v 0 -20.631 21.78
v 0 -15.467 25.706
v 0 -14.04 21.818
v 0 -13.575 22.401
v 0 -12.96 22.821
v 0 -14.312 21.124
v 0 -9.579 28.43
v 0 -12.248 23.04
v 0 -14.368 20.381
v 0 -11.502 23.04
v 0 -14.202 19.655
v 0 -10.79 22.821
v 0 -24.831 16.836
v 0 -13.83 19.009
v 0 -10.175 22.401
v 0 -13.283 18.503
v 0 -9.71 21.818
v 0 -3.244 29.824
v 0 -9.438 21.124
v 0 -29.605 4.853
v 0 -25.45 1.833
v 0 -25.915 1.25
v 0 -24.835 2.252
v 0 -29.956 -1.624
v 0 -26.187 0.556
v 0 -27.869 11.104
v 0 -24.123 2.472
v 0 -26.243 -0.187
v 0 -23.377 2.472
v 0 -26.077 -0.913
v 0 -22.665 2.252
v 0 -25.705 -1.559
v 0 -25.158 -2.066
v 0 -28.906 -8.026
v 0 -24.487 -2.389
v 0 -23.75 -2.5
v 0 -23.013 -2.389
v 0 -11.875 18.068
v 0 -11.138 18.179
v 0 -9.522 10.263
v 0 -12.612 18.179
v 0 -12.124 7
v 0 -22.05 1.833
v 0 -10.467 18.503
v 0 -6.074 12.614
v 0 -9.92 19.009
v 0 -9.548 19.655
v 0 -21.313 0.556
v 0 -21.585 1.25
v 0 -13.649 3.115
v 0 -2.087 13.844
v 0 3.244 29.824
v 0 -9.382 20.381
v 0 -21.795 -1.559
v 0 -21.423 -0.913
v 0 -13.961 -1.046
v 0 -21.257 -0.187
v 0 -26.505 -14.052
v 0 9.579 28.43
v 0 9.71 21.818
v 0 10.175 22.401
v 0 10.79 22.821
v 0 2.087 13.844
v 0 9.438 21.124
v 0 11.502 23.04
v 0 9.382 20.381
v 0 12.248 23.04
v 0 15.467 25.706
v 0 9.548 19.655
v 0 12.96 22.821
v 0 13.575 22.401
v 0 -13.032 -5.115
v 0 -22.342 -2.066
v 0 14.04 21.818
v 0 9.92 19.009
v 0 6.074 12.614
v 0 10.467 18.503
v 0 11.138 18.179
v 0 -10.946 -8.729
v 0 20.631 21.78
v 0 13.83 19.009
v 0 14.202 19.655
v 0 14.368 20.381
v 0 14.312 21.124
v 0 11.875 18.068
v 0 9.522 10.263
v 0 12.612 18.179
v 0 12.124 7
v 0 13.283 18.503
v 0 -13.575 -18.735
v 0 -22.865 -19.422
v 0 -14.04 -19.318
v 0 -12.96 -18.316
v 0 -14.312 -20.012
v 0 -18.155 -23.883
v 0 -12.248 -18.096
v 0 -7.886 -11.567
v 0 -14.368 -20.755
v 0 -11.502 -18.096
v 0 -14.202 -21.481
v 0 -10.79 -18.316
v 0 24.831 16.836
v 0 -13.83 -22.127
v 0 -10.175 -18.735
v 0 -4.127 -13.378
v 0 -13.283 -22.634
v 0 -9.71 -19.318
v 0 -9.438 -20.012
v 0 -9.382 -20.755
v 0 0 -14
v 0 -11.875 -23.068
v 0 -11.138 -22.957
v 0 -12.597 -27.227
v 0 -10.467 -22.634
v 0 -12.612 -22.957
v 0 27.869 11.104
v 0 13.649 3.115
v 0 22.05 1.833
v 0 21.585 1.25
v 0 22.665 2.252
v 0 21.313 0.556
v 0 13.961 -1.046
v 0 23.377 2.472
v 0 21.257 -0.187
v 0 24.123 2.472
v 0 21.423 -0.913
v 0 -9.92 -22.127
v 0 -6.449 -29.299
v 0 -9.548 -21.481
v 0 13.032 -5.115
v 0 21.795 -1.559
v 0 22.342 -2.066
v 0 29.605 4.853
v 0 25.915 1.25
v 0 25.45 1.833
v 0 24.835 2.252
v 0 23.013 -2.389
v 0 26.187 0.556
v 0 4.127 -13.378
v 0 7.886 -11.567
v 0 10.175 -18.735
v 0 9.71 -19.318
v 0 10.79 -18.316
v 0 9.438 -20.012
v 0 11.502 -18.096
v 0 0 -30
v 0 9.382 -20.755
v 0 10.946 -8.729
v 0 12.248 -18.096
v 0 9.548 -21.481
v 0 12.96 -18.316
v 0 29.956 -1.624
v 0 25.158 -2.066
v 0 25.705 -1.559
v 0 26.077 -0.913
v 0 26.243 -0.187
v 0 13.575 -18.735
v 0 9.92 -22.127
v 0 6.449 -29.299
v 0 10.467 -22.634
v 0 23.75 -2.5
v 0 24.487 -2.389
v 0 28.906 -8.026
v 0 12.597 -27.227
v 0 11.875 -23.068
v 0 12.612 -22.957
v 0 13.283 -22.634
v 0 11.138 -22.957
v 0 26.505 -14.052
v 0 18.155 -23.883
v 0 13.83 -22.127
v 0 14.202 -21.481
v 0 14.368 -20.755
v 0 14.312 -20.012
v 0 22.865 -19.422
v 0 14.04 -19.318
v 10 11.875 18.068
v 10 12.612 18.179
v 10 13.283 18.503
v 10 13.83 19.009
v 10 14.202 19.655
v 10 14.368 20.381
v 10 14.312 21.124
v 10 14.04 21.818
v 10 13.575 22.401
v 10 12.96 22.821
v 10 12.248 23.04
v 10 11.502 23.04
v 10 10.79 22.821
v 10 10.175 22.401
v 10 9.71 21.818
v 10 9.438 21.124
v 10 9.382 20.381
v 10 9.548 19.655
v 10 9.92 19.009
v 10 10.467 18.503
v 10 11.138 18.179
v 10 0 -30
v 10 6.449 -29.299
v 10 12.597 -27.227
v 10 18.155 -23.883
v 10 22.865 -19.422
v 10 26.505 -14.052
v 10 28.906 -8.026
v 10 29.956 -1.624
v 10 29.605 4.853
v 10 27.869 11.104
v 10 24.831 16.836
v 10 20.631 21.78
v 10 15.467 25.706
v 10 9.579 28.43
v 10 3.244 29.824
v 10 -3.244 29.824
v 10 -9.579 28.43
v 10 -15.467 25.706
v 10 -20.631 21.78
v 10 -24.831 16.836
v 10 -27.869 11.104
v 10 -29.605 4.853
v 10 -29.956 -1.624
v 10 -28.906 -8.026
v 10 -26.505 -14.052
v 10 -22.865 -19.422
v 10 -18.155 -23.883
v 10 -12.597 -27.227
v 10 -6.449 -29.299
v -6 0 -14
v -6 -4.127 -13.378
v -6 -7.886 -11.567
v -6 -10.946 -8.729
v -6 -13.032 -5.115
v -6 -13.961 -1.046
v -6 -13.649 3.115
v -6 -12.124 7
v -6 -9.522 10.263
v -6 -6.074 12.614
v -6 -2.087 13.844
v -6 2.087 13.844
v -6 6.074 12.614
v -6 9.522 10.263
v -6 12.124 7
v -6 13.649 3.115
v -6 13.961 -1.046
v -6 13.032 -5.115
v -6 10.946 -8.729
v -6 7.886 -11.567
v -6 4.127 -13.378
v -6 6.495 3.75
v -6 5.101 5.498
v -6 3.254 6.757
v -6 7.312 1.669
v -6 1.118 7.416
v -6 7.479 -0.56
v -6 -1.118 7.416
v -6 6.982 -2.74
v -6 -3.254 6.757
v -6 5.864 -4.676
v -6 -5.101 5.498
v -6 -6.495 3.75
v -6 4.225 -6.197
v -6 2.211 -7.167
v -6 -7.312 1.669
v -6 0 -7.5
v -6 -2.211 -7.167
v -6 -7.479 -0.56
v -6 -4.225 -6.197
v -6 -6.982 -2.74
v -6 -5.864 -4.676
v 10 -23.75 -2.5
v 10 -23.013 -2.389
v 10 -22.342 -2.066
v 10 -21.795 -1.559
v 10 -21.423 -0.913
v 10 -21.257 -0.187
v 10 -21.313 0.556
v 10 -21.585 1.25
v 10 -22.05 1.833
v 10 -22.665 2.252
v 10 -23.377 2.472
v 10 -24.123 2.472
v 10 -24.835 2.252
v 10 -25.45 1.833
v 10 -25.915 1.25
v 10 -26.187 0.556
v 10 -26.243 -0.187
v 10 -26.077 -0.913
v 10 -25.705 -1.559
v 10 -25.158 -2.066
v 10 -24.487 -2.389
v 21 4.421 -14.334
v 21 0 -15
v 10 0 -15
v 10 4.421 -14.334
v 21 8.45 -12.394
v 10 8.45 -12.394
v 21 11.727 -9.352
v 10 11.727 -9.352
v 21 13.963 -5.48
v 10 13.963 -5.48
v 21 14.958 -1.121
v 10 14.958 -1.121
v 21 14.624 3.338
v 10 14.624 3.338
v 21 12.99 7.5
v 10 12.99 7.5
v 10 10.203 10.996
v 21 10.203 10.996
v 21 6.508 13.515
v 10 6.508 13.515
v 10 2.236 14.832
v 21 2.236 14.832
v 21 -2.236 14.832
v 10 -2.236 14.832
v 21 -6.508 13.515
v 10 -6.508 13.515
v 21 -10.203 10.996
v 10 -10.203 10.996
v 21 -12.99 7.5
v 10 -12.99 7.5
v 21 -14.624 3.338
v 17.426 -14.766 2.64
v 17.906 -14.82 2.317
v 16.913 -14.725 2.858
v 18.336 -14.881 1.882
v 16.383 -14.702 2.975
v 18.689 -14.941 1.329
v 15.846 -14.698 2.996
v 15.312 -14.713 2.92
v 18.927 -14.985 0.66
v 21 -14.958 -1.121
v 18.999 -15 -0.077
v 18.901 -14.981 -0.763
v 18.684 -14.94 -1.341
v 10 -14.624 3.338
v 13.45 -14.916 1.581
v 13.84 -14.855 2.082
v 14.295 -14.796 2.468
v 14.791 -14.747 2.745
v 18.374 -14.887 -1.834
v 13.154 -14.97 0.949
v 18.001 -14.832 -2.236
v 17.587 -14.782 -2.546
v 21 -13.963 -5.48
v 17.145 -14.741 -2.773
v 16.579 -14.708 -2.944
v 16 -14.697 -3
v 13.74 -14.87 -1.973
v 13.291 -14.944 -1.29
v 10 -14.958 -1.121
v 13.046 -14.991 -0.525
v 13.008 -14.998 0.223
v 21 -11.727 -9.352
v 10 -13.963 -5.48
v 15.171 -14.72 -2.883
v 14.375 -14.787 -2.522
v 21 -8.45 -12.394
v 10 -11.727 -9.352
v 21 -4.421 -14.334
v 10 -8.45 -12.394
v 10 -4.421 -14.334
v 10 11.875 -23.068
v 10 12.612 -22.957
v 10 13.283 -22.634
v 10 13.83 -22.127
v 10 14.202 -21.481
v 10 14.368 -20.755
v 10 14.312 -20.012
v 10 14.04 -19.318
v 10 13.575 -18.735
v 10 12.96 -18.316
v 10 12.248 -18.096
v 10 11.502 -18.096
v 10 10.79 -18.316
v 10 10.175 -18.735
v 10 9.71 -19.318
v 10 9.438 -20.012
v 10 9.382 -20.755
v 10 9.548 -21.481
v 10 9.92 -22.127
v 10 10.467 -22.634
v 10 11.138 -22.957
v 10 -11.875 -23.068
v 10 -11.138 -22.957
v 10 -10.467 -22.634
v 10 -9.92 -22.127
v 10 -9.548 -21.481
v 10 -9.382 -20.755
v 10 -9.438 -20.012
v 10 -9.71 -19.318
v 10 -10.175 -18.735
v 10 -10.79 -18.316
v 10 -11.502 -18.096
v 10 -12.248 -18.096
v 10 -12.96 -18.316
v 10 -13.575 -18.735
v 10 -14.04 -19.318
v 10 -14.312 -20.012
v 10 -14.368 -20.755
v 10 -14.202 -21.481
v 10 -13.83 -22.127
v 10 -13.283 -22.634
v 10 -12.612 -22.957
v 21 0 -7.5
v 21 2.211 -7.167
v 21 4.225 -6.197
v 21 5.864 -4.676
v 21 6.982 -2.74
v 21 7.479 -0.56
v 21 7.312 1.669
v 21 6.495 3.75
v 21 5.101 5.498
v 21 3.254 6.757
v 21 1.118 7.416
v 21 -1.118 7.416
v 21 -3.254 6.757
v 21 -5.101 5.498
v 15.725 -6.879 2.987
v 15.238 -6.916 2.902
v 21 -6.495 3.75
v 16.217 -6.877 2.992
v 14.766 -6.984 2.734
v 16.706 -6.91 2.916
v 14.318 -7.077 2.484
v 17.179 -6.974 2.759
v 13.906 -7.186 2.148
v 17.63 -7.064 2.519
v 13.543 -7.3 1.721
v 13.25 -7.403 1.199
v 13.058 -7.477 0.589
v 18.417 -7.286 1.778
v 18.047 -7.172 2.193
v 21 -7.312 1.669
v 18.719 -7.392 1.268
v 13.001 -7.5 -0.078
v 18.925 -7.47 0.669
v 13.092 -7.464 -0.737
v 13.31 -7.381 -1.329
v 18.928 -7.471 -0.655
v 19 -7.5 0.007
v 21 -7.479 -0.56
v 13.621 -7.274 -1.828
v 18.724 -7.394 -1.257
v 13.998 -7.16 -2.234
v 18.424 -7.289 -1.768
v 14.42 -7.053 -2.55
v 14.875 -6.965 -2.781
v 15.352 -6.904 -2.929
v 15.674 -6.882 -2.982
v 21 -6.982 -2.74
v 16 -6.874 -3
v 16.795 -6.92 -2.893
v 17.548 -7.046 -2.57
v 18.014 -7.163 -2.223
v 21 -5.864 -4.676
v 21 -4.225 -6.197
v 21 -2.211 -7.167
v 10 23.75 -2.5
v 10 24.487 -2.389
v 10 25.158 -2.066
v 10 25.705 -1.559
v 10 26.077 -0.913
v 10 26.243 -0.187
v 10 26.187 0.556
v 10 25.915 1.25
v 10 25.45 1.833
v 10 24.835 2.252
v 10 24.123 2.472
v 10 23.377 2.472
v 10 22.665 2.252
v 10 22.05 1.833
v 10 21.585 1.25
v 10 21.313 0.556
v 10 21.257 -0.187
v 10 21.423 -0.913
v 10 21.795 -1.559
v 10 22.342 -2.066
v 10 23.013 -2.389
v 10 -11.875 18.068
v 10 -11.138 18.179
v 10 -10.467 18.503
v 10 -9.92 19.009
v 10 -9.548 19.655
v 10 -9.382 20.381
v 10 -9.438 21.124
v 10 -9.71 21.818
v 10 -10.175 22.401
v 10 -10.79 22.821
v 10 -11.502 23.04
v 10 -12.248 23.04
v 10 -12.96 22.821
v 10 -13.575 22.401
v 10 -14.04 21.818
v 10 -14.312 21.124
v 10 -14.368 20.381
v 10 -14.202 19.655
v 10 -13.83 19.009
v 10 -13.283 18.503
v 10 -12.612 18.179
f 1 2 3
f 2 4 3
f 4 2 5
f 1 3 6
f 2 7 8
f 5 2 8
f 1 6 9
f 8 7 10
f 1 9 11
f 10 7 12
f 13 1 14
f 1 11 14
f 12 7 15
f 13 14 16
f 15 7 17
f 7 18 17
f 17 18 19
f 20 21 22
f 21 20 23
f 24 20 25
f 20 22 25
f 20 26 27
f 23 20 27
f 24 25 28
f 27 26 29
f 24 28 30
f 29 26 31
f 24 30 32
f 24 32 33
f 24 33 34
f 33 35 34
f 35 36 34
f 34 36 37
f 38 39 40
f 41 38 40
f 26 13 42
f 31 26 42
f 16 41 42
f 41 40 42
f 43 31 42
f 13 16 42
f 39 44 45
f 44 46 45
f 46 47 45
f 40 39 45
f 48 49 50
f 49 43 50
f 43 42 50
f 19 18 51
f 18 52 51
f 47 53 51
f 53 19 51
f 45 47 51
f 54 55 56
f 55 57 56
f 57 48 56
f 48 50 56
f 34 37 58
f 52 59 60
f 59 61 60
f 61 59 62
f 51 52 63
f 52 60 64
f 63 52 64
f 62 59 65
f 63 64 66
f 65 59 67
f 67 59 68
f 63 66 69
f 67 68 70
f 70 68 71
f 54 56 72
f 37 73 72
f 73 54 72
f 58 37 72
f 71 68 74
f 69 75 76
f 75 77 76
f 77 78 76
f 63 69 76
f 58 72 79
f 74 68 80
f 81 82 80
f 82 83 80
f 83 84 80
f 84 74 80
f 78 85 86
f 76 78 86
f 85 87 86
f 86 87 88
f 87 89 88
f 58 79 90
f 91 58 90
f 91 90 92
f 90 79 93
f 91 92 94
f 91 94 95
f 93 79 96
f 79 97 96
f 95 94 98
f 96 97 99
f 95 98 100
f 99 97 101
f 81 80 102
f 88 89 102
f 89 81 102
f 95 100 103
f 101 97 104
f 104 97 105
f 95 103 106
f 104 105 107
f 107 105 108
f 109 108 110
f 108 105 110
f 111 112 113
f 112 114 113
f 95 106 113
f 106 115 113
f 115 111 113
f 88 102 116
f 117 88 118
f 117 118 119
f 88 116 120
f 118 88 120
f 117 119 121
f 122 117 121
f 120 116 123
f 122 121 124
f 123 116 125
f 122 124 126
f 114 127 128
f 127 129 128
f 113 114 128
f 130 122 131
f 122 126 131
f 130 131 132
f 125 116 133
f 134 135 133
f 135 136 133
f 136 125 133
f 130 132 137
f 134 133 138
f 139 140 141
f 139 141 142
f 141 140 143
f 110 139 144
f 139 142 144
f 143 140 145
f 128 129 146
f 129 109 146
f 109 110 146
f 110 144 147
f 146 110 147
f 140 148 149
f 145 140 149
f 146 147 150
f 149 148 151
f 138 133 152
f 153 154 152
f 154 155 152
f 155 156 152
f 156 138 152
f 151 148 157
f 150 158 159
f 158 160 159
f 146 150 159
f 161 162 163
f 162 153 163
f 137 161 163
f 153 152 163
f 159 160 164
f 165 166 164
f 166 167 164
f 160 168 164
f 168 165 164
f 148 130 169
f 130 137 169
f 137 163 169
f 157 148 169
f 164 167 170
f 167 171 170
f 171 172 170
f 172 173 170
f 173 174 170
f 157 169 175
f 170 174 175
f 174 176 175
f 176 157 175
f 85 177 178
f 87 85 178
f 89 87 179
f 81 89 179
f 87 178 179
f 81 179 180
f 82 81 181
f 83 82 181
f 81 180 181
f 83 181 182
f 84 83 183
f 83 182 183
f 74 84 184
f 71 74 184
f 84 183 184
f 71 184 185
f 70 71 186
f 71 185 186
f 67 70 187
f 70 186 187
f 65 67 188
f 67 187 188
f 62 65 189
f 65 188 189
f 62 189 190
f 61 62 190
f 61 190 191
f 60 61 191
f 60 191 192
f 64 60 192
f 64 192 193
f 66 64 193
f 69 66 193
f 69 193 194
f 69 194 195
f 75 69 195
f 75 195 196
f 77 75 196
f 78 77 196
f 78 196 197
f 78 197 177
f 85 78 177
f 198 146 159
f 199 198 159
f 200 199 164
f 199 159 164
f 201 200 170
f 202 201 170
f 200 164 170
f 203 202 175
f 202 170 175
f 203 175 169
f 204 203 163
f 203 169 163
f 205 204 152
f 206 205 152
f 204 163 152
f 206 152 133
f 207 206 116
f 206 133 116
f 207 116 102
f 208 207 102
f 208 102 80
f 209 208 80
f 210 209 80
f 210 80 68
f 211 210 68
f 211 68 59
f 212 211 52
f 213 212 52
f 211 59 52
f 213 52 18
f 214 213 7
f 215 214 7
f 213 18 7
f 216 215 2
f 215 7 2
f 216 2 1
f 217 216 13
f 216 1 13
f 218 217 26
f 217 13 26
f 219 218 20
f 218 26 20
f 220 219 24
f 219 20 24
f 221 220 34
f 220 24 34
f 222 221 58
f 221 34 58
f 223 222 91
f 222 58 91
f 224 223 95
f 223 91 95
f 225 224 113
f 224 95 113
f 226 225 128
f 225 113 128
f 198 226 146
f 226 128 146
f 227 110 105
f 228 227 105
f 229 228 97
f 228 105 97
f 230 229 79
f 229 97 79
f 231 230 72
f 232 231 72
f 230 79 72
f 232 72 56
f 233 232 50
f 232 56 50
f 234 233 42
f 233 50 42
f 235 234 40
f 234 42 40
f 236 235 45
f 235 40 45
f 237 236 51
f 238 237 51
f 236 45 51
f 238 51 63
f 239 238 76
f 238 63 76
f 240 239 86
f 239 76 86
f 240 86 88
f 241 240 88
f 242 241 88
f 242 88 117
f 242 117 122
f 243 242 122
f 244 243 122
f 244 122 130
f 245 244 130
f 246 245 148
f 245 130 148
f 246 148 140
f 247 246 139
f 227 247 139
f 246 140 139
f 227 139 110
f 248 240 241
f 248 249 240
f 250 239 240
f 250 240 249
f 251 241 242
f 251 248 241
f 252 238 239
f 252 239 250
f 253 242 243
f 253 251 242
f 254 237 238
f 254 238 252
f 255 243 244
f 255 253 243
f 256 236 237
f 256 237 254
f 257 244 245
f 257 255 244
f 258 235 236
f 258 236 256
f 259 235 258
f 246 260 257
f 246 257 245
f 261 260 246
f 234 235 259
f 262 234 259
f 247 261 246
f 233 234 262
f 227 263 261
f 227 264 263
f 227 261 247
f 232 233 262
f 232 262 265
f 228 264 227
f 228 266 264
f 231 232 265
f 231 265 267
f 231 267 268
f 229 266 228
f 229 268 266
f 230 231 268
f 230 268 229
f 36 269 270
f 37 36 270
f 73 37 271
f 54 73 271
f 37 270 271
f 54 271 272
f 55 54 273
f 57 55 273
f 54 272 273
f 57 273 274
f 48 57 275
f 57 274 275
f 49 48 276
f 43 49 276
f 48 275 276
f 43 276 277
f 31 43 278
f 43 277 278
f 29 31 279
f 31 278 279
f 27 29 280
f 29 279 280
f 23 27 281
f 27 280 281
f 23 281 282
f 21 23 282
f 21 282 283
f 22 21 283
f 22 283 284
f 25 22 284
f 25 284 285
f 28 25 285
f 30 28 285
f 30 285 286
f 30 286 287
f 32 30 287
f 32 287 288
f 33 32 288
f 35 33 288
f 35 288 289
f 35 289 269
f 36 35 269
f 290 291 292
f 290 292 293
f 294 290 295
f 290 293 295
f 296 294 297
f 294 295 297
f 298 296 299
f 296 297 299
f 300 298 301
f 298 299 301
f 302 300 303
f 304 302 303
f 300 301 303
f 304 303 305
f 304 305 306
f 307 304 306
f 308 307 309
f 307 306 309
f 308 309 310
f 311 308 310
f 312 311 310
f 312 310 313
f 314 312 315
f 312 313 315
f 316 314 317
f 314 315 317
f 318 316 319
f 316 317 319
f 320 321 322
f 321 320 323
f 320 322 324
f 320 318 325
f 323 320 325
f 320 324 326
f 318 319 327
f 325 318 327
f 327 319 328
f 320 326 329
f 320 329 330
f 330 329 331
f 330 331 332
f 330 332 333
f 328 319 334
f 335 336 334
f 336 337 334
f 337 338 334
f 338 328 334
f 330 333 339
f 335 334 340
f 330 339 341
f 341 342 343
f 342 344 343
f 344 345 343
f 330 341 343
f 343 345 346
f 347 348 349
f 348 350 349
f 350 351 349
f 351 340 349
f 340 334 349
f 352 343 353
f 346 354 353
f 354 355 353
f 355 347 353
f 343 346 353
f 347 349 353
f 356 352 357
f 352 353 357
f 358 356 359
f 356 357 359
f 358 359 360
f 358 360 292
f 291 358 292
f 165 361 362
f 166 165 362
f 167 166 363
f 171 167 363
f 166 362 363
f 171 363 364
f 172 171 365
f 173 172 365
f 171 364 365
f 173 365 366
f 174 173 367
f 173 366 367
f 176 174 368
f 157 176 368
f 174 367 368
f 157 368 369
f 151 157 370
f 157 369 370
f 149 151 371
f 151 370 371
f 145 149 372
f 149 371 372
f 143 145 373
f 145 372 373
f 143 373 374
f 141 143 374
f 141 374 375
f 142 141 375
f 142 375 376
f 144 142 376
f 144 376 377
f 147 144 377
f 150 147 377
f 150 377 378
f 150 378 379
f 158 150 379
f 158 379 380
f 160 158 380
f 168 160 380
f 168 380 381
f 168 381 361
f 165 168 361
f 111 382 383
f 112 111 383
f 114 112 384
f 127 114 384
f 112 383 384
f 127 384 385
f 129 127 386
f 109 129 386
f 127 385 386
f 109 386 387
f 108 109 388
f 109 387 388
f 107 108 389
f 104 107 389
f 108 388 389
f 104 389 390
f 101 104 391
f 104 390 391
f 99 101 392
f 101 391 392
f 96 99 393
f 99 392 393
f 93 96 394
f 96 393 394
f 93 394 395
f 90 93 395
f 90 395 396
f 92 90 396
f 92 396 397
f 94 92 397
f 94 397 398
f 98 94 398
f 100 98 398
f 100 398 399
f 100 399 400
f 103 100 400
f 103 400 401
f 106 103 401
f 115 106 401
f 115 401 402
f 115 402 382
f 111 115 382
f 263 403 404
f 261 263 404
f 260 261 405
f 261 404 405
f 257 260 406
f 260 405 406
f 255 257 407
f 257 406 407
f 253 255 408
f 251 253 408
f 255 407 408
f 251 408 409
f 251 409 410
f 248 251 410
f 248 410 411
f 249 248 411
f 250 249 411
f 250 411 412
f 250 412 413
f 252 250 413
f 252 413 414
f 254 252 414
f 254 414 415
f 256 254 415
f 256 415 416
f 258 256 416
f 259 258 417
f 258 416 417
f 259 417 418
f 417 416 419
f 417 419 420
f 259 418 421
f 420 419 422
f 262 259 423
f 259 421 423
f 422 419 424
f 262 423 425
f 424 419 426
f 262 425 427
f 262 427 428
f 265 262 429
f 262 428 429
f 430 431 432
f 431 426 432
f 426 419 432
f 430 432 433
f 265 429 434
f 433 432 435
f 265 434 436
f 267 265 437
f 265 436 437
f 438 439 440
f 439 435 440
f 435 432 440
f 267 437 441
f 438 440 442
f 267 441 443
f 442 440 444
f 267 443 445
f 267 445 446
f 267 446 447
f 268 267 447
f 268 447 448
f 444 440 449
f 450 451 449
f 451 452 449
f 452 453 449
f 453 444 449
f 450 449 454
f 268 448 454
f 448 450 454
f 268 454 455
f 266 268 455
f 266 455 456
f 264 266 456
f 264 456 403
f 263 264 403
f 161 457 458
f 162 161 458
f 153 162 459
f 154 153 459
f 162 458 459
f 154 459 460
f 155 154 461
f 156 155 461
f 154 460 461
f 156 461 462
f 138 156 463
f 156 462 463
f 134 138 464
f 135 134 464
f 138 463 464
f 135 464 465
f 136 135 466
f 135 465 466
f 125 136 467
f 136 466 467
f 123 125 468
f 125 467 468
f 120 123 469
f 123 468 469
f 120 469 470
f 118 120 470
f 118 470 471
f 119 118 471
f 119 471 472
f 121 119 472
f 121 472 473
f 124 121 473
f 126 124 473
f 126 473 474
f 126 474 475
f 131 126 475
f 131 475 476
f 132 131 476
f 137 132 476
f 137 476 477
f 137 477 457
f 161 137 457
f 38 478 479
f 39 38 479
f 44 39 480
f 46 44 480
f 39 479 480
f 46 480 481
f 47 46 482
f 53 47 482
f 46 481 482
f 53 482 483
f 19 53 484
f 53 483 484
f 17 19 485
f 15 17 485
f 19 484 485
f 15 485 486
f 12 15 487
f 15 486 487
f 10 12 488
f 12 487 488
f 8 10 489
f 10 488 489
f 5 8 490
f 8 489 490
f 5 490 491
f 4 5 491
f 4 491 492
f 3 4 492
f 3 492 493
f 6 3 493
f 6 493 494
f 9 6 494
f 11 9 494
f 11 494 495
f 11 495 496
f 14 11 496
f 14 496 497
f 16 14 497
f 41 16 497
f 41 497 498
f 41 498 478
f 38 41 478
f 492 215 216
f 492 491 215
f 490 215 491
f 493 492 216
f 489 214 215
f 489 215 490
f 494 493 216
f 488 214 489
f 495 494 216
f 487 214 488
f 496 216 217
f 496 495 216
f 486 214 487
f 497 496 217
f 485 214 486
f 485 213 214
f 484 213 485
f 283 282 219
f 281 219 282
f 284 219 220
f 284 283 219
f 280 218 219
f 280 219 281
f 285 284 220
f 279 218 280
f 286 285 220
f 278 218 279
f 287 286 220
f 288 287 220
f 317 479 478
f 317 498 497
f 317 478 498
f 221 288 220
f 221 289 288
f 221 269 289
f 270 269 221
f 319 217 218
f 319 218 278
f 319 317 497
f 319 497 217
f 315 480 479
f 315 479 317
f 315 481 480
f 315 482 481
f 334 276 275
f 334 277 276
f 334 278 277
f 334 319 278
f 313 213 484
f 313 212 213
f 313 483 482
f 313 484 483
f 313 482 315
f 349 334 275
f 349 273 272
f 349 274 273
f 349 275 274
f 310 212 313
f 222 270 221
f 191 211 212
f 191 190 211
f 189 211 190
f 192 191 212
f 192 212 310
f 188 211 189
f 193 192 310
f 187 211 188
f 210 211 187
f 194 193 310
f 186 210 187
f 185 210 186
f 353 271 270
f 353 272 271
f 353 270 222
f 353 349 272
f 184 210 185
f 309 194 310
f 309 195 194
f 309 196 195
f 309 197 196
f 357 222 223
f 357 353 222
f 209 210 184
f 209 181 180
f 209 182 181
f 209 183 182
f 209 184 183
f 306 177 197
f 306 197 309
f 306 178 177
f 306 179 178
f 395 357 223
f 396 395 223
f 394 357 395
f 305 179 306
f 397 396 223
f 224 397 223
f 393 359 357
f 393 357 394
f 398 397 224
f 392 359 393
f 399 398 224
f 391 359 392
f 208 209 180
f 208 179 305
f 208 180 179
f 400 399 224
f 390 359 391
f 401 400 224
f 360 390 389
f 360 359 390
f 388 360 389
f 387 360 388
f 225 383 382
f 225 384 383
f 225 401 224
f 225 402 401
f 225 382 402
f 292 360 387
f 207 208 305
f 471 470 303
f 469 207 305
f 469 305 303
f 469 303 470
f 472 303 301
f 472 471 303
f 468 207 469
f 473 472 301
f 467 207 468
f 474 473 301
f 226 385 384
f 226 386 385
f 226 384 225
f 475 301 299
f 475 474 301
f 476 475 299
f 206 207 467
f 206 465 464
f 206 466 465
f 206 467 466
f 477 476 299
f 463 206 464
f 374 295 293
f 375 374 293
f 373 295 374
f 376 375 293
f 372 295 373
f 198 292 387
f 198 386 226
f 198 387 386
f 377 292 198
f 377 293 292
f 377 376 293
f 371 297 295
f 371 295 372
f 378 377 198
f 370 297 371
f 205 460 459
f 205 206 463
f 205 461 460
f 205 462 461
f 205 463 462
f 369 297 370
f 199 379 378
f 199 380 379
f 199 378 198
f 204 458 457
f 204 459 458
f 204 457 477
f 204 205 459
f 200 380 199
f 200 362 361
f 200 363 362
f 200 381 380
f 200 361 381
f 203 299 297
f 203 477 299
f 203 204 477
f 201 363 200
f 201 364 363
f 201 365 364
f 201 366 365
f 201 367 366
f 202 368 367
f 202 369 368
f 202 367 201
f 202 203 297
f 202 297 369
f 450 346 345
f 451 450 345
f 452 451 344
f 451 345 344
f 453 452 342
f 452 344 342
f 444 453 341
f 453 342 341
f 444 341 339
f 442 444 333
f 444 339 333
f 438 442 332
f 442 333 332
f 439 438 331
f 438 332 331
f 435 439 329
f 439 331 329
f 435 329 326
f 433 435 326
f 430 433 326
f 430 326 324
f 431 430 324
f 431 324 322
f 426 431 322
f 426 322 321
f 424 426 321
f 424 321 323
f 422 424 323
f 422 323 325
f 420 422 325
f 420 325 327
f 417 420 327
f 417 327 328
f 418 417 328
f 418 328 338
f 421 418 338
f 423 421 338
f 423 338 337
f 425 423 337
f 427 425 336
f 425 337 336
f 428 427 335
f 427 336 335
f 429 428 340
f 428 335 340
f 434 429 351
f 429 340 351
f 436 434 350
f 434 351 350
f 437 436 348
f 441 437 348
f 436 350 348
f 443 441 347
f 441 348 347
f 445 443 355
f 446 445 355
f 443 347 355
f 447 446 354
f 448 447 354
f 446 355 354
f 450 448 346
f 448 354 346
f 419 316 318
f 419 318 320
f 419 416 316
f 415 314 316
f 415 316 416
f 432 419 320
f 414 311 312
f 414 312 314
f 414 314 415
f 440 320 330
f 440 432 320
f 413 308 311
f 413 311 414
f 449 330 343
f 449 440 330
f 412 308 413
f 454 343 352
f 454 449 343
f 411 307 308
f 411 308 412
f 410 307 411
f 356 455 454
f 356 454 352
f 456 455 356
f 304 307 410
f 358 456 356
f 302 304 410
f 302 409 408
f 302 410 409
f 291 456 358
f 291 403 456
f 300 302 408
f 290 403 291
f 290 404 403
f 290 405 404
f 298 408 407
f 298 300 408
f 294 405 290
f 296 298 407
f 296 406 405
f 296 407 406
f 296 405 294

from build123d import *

# Parameters (mm, degrees)
SKETCH1_R               = 30
BOSS_EXTRUDE1_DEPTH     = 10
SKETCH2_R               = 2.5
CUT_EXTRUDE1_DEPTH      = 44.588989435
SKETCH5_R               = 14
BOSS_EXTRUDE4_DEPTH     = 6
SKETCH8_R               = 15
BOSS_EXTRUDE6_DEPTH     = 1
SKETCH13_R              = 15
BOSS_EXTRUDE7_DEPTH     = 10
CUT_EXTRUDE4_REACH      = 52.289
SKETCH14_R              = 7.5
CUT_EXTRUDE3_REACH      = 60.017
CUT_EXTRUDE3_END_RADIUS = 7.5
SKETCH12_R              = 3


with BuildPart() as part:
    # Sketch1 → Boss-Extrude1 (new body)
    with BuildSketch(Plane(origin=(0, 0, 0), x_dir=(0, 0, -1), z_dir=(1, 0, 0))):
        Circle(SKETCH1_R)
    extrude(amount=BOSS_EXTRUDE1_DEPTH)

    # Sketch2 → Cut-Extrude1 (cut, through all)
    with BuildSketch(Plane(origin=(10, 0, 0), x_dir=(0, 0, -1), z_dir=(1, 0, 0))):
        with Locations((0, 23.75)):
            Circle(SKETCH2_R)
        with Locations((20.56810334, 11.875)):
            Circle(SKETCH2_R)
        with Locations((20.56810334, -11.875)):
            Circle(SKETCH2_R)
        with Locations((0, -23.75)):
            Circle(SKETCH2_R)
        with Locations((-20.56810334, -11.875)):
            Circle(SKETCH2_R)
        with Locations((-20.56810334, 11.875)):
            Circle(SKETCH2_R)
    extrude(amount=-CUT_EXTRUDE1_DEPTH, mode=Mode.SUBTRACT)

    # Sketch5 → Boss-Extrude4 (add)
    with BuildSketch(Plane.ZY):
        with Locations(Location((0, 0, 0), (0, 0, 180))):
            Circle(SKETCH5_R)
    extrude(amount=BOSS_EXTRUDE4_DEPTH)

    # Sketch8 → Boss-Extrude6 (add)
    with BuildSketch(Plane(origin=(10, 0, 0), x_dir=(0, 0, -1), z_dir=(1, 0, 0))):
        Circle(SKETCH8_R)
    extrude(amount=BOSS_EXTRUDE6_DEPTH)

    # Sketch13 → Boss-Extrude7 (add)
    with BuildSketch(Plane(origin=(11, 0, 0), x_dir=(0, 0, -1), z_dir=(1, 0, 0))):
        Circle(SKETCH13_R)
    extrude(amount=BOSS_EXTRUDE7_DEPTH)

    # Sketch14 → Cut-Extrude4 (cut, up to next)
    with BuildSketch(Plane(origin=(21, 0, 0), x_dir=(0, 0, -1), z_dir=(1, 0, 0)), mode=Mode.PRIVATE) as cut_extrude4_sk1:
        Circle(SKETCH14_R)
    cut_extrude4_tool1 = extrude(cut_extrude4_sk1.sketch, amount=-CUT_EXTRUDE4_REACH, mode=Mode.PRIVATE) & part.part
    add(cut_extrude4_tool1.solids().sort_by_distance((21, 0, 0))[0], mode=Mode.SUBTRACT)

    # Cut-Extrude3: up to this cylinder (the profile starts outside it)
    cut_extrude3_end = Plane(origin=(16, 0, 0), z_dir=(1, 0, 0)) * Cylinder(CUT_EXTRUDE3_END_RADIUS, 136.034, mode=Mode.PRIVATE)
    # Sketch12 → Cut-Extrude3 (cut, up to the surface)
    with BuildSketch(Plane(origin=(0, -15, 0), x_dir=(-1, 0, 0), z_dir=(0, -1, 0)), mode=Mode.PRIVATE) as cut_extrude3_sk1:
        with Locations(Location((-16, 0, 0), (0, 0, 90))):
            Circle(SKETCH12_R)
    cut_extrude3_tool1 = extrude(cut_extrude3_sk1.sketch, amount=-CUT_EXTRUDE3_REACH, mode=Mode.PRIVATE) - cut_extrude3_end
    add(cut_extrude3_tool1.solids().sort_by_distance((16, -15, 0))[0], mode=Mode.SUBTRACT)


solid = part.part
